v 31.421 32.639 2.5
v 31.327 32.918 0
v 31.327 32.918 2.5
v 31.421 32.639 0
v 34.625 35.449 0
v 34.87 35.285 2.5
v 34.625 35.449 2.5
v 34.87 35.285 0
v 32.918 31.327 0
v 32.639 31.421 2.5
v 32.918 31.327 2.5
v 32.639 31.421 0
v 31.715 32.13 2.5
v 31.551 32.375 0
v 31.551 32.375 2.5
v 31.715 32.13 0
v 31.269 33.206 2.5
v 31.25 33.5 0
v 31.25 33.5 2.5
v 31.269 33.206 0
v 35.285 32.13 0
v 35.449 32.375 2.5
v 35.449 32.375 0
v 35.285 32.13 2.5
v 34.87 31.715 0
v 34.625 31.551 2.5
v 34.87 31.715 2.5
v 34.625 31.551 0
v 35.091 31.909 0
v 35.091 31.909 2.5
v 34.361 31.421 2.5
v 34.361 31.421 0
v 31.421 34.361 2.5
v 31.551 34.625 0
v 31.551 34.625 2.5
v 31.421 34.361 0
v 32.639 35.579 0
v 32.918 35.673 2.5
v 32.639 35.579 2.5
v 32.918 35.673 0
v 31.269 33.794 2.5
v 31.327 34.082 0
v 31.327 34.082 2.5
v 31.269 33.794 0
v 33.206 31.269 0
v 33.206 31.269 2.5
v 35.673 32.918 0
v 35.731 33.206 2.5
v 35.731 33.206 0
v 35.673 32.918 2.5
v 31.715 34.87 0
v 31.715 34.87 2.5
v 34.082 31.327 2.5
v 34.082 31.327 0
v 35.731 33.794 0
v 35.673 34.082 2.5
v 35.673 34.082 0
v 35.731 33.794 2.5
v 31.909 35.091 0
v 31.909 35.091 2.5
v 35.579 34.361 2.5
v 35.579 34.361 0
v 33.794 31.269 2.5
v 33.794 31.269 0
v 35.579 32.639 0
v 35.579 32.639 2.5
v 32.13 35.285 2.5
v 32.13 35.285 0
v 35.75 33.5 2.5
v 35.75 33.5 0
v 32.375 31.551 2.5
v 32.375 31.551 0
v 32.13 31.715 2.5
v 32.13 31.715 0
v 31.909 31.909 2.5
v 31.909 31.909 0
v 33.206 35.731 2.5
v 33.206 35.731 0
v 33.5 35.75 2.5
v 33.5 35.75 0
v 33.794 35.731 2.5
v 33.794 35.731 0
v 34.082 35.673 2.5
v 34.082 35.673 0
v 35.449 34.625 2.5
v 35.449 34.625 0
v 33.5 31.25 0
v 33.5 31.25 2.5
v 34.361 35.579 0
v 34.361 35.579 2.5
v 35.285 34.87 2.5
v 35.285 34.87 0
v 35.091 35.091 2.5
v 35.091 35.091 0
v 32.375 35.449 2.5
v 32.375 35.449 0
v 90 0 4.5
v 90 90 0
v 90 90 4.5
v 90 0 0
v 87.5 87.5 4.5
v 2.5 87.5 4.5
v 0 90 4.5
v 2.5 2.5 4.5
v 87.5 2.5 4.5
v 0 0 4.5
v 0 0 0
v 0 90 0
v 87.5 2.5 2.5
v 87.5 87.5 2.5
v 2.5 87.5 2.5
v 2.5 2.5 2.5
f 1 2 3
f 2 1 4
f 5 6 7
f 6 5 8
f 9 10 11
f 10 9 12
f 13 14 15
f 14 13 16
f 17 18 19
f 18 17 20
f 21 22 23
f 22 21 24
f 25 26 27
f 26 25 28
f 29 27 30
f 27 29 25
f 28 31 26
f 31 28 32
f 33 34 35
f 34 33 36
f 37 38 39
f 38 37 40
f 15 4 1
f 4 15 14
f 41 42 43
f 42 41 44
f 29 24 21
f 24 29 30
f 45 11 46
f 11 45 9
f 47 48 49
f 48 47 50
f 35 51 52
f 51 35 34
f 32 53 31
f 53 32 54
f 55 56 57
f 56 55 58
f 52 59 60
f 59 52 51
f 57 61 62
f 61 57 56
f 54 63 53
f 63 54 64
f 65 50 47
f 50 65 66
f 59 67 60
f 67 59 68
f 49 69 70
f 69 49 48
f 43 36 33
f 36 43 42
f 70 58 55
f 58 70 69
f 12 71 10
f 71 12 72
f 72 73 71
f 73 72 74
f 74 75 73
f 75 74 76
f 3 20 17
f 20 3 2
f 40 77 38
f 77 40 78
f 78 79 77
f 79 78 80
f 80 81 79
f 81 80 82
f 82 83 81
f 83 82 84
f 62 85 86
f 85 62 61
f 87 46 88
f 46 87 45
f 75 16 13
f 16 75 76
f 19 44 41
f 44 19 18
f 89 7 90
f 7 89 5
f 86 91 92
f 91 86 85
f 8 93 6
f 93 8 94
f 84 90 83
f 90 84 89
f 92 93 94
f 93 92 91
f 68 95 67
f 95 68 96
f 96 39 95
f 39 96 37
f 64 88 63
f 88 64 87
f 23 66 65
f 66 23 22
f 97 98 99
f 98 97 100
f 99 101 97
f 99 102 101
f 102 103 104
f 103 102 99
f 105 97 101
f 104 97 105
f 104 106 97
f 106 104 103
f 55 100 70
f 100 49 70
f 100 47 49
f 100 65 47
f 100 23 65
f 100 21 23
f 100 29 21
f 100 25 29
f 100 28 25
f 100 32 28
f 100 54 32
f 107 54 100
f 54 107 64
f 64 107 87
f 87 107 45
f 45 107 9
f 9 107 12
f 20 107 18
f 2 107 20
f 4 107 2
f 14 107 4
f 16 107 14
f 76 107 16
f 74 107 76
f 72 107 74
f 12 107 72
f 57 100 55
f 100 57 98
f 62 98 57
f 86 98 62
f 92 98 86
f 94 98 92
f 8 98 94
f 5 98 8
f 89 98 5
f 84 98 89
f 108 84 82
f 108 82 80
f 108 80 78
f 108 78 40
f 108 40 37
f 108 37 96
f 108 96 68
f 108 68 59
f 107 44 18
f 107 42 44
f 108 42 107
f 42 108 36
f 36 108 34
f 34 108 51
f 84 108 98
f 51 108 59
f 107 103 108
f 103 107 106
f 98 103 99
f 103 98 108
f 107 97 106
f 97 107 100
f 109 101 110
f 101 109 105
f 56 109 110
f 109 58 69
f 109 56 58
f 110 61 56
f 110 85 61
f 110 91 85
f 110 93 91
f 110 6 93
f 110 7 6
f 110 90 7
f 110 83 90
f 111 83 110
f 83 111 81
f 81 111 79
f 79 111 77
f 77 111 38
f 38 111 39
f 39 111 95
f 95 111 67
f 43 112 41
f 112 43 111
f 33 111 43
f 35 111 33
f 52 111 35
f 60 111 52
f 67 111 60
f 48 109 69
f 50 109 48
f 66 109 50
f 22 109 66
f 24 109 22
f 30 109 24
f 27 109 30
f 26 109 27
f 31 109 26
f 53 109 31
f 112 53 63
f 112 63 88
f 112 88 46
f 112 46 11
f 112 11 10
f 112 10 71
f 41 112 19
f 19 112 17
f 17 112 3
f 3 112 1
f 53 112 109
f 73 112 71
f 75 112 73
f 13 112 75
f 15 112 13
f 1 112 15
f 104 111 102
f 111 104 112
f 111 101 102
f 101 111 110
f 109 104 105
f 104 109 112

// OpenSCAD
// Fan cover - a simple open box (open top) that mounts over a round PC case fan to turn it into
// a magnetic stirrer. The top plate is the stirring surface. This is the print orientation: the
// top plate lies on the bed (z = 0) and the walls rise upward.
//

top     = 2;
walls   = 2.5;
open_z  = 40;
outer_x = 90;
outer_y = 90;
screw   = 4.5;
pattern = 71.5;
cable_w = 12;

$fn = 48;

inner_x = outer_x - 2 * walls;
inner_y = outer_y - 2 * walls;

difference() {
    cube([outer_x, outer_y, top + walls]);
    translate([walls, walls, walls]) cube([inner_x, inner_y, open_z - walls + 0.01]);   // hollow, open top
    for (i = [0 : 3])
        rotate([0, 0, 90 * i])
            translate([-(pattern / 2 - screw / 2), -(pattern / 2 - screw / 2), -1])
                cylinder(h = top + 2, d = screw);                                      // screw holes
    translate([outer_x / 2, outer_y / 2, open_z - 1])
        cube([cable_w, outer_y + 2, 8]);                                               // cable notch (cuts through the top of one wall)
}
